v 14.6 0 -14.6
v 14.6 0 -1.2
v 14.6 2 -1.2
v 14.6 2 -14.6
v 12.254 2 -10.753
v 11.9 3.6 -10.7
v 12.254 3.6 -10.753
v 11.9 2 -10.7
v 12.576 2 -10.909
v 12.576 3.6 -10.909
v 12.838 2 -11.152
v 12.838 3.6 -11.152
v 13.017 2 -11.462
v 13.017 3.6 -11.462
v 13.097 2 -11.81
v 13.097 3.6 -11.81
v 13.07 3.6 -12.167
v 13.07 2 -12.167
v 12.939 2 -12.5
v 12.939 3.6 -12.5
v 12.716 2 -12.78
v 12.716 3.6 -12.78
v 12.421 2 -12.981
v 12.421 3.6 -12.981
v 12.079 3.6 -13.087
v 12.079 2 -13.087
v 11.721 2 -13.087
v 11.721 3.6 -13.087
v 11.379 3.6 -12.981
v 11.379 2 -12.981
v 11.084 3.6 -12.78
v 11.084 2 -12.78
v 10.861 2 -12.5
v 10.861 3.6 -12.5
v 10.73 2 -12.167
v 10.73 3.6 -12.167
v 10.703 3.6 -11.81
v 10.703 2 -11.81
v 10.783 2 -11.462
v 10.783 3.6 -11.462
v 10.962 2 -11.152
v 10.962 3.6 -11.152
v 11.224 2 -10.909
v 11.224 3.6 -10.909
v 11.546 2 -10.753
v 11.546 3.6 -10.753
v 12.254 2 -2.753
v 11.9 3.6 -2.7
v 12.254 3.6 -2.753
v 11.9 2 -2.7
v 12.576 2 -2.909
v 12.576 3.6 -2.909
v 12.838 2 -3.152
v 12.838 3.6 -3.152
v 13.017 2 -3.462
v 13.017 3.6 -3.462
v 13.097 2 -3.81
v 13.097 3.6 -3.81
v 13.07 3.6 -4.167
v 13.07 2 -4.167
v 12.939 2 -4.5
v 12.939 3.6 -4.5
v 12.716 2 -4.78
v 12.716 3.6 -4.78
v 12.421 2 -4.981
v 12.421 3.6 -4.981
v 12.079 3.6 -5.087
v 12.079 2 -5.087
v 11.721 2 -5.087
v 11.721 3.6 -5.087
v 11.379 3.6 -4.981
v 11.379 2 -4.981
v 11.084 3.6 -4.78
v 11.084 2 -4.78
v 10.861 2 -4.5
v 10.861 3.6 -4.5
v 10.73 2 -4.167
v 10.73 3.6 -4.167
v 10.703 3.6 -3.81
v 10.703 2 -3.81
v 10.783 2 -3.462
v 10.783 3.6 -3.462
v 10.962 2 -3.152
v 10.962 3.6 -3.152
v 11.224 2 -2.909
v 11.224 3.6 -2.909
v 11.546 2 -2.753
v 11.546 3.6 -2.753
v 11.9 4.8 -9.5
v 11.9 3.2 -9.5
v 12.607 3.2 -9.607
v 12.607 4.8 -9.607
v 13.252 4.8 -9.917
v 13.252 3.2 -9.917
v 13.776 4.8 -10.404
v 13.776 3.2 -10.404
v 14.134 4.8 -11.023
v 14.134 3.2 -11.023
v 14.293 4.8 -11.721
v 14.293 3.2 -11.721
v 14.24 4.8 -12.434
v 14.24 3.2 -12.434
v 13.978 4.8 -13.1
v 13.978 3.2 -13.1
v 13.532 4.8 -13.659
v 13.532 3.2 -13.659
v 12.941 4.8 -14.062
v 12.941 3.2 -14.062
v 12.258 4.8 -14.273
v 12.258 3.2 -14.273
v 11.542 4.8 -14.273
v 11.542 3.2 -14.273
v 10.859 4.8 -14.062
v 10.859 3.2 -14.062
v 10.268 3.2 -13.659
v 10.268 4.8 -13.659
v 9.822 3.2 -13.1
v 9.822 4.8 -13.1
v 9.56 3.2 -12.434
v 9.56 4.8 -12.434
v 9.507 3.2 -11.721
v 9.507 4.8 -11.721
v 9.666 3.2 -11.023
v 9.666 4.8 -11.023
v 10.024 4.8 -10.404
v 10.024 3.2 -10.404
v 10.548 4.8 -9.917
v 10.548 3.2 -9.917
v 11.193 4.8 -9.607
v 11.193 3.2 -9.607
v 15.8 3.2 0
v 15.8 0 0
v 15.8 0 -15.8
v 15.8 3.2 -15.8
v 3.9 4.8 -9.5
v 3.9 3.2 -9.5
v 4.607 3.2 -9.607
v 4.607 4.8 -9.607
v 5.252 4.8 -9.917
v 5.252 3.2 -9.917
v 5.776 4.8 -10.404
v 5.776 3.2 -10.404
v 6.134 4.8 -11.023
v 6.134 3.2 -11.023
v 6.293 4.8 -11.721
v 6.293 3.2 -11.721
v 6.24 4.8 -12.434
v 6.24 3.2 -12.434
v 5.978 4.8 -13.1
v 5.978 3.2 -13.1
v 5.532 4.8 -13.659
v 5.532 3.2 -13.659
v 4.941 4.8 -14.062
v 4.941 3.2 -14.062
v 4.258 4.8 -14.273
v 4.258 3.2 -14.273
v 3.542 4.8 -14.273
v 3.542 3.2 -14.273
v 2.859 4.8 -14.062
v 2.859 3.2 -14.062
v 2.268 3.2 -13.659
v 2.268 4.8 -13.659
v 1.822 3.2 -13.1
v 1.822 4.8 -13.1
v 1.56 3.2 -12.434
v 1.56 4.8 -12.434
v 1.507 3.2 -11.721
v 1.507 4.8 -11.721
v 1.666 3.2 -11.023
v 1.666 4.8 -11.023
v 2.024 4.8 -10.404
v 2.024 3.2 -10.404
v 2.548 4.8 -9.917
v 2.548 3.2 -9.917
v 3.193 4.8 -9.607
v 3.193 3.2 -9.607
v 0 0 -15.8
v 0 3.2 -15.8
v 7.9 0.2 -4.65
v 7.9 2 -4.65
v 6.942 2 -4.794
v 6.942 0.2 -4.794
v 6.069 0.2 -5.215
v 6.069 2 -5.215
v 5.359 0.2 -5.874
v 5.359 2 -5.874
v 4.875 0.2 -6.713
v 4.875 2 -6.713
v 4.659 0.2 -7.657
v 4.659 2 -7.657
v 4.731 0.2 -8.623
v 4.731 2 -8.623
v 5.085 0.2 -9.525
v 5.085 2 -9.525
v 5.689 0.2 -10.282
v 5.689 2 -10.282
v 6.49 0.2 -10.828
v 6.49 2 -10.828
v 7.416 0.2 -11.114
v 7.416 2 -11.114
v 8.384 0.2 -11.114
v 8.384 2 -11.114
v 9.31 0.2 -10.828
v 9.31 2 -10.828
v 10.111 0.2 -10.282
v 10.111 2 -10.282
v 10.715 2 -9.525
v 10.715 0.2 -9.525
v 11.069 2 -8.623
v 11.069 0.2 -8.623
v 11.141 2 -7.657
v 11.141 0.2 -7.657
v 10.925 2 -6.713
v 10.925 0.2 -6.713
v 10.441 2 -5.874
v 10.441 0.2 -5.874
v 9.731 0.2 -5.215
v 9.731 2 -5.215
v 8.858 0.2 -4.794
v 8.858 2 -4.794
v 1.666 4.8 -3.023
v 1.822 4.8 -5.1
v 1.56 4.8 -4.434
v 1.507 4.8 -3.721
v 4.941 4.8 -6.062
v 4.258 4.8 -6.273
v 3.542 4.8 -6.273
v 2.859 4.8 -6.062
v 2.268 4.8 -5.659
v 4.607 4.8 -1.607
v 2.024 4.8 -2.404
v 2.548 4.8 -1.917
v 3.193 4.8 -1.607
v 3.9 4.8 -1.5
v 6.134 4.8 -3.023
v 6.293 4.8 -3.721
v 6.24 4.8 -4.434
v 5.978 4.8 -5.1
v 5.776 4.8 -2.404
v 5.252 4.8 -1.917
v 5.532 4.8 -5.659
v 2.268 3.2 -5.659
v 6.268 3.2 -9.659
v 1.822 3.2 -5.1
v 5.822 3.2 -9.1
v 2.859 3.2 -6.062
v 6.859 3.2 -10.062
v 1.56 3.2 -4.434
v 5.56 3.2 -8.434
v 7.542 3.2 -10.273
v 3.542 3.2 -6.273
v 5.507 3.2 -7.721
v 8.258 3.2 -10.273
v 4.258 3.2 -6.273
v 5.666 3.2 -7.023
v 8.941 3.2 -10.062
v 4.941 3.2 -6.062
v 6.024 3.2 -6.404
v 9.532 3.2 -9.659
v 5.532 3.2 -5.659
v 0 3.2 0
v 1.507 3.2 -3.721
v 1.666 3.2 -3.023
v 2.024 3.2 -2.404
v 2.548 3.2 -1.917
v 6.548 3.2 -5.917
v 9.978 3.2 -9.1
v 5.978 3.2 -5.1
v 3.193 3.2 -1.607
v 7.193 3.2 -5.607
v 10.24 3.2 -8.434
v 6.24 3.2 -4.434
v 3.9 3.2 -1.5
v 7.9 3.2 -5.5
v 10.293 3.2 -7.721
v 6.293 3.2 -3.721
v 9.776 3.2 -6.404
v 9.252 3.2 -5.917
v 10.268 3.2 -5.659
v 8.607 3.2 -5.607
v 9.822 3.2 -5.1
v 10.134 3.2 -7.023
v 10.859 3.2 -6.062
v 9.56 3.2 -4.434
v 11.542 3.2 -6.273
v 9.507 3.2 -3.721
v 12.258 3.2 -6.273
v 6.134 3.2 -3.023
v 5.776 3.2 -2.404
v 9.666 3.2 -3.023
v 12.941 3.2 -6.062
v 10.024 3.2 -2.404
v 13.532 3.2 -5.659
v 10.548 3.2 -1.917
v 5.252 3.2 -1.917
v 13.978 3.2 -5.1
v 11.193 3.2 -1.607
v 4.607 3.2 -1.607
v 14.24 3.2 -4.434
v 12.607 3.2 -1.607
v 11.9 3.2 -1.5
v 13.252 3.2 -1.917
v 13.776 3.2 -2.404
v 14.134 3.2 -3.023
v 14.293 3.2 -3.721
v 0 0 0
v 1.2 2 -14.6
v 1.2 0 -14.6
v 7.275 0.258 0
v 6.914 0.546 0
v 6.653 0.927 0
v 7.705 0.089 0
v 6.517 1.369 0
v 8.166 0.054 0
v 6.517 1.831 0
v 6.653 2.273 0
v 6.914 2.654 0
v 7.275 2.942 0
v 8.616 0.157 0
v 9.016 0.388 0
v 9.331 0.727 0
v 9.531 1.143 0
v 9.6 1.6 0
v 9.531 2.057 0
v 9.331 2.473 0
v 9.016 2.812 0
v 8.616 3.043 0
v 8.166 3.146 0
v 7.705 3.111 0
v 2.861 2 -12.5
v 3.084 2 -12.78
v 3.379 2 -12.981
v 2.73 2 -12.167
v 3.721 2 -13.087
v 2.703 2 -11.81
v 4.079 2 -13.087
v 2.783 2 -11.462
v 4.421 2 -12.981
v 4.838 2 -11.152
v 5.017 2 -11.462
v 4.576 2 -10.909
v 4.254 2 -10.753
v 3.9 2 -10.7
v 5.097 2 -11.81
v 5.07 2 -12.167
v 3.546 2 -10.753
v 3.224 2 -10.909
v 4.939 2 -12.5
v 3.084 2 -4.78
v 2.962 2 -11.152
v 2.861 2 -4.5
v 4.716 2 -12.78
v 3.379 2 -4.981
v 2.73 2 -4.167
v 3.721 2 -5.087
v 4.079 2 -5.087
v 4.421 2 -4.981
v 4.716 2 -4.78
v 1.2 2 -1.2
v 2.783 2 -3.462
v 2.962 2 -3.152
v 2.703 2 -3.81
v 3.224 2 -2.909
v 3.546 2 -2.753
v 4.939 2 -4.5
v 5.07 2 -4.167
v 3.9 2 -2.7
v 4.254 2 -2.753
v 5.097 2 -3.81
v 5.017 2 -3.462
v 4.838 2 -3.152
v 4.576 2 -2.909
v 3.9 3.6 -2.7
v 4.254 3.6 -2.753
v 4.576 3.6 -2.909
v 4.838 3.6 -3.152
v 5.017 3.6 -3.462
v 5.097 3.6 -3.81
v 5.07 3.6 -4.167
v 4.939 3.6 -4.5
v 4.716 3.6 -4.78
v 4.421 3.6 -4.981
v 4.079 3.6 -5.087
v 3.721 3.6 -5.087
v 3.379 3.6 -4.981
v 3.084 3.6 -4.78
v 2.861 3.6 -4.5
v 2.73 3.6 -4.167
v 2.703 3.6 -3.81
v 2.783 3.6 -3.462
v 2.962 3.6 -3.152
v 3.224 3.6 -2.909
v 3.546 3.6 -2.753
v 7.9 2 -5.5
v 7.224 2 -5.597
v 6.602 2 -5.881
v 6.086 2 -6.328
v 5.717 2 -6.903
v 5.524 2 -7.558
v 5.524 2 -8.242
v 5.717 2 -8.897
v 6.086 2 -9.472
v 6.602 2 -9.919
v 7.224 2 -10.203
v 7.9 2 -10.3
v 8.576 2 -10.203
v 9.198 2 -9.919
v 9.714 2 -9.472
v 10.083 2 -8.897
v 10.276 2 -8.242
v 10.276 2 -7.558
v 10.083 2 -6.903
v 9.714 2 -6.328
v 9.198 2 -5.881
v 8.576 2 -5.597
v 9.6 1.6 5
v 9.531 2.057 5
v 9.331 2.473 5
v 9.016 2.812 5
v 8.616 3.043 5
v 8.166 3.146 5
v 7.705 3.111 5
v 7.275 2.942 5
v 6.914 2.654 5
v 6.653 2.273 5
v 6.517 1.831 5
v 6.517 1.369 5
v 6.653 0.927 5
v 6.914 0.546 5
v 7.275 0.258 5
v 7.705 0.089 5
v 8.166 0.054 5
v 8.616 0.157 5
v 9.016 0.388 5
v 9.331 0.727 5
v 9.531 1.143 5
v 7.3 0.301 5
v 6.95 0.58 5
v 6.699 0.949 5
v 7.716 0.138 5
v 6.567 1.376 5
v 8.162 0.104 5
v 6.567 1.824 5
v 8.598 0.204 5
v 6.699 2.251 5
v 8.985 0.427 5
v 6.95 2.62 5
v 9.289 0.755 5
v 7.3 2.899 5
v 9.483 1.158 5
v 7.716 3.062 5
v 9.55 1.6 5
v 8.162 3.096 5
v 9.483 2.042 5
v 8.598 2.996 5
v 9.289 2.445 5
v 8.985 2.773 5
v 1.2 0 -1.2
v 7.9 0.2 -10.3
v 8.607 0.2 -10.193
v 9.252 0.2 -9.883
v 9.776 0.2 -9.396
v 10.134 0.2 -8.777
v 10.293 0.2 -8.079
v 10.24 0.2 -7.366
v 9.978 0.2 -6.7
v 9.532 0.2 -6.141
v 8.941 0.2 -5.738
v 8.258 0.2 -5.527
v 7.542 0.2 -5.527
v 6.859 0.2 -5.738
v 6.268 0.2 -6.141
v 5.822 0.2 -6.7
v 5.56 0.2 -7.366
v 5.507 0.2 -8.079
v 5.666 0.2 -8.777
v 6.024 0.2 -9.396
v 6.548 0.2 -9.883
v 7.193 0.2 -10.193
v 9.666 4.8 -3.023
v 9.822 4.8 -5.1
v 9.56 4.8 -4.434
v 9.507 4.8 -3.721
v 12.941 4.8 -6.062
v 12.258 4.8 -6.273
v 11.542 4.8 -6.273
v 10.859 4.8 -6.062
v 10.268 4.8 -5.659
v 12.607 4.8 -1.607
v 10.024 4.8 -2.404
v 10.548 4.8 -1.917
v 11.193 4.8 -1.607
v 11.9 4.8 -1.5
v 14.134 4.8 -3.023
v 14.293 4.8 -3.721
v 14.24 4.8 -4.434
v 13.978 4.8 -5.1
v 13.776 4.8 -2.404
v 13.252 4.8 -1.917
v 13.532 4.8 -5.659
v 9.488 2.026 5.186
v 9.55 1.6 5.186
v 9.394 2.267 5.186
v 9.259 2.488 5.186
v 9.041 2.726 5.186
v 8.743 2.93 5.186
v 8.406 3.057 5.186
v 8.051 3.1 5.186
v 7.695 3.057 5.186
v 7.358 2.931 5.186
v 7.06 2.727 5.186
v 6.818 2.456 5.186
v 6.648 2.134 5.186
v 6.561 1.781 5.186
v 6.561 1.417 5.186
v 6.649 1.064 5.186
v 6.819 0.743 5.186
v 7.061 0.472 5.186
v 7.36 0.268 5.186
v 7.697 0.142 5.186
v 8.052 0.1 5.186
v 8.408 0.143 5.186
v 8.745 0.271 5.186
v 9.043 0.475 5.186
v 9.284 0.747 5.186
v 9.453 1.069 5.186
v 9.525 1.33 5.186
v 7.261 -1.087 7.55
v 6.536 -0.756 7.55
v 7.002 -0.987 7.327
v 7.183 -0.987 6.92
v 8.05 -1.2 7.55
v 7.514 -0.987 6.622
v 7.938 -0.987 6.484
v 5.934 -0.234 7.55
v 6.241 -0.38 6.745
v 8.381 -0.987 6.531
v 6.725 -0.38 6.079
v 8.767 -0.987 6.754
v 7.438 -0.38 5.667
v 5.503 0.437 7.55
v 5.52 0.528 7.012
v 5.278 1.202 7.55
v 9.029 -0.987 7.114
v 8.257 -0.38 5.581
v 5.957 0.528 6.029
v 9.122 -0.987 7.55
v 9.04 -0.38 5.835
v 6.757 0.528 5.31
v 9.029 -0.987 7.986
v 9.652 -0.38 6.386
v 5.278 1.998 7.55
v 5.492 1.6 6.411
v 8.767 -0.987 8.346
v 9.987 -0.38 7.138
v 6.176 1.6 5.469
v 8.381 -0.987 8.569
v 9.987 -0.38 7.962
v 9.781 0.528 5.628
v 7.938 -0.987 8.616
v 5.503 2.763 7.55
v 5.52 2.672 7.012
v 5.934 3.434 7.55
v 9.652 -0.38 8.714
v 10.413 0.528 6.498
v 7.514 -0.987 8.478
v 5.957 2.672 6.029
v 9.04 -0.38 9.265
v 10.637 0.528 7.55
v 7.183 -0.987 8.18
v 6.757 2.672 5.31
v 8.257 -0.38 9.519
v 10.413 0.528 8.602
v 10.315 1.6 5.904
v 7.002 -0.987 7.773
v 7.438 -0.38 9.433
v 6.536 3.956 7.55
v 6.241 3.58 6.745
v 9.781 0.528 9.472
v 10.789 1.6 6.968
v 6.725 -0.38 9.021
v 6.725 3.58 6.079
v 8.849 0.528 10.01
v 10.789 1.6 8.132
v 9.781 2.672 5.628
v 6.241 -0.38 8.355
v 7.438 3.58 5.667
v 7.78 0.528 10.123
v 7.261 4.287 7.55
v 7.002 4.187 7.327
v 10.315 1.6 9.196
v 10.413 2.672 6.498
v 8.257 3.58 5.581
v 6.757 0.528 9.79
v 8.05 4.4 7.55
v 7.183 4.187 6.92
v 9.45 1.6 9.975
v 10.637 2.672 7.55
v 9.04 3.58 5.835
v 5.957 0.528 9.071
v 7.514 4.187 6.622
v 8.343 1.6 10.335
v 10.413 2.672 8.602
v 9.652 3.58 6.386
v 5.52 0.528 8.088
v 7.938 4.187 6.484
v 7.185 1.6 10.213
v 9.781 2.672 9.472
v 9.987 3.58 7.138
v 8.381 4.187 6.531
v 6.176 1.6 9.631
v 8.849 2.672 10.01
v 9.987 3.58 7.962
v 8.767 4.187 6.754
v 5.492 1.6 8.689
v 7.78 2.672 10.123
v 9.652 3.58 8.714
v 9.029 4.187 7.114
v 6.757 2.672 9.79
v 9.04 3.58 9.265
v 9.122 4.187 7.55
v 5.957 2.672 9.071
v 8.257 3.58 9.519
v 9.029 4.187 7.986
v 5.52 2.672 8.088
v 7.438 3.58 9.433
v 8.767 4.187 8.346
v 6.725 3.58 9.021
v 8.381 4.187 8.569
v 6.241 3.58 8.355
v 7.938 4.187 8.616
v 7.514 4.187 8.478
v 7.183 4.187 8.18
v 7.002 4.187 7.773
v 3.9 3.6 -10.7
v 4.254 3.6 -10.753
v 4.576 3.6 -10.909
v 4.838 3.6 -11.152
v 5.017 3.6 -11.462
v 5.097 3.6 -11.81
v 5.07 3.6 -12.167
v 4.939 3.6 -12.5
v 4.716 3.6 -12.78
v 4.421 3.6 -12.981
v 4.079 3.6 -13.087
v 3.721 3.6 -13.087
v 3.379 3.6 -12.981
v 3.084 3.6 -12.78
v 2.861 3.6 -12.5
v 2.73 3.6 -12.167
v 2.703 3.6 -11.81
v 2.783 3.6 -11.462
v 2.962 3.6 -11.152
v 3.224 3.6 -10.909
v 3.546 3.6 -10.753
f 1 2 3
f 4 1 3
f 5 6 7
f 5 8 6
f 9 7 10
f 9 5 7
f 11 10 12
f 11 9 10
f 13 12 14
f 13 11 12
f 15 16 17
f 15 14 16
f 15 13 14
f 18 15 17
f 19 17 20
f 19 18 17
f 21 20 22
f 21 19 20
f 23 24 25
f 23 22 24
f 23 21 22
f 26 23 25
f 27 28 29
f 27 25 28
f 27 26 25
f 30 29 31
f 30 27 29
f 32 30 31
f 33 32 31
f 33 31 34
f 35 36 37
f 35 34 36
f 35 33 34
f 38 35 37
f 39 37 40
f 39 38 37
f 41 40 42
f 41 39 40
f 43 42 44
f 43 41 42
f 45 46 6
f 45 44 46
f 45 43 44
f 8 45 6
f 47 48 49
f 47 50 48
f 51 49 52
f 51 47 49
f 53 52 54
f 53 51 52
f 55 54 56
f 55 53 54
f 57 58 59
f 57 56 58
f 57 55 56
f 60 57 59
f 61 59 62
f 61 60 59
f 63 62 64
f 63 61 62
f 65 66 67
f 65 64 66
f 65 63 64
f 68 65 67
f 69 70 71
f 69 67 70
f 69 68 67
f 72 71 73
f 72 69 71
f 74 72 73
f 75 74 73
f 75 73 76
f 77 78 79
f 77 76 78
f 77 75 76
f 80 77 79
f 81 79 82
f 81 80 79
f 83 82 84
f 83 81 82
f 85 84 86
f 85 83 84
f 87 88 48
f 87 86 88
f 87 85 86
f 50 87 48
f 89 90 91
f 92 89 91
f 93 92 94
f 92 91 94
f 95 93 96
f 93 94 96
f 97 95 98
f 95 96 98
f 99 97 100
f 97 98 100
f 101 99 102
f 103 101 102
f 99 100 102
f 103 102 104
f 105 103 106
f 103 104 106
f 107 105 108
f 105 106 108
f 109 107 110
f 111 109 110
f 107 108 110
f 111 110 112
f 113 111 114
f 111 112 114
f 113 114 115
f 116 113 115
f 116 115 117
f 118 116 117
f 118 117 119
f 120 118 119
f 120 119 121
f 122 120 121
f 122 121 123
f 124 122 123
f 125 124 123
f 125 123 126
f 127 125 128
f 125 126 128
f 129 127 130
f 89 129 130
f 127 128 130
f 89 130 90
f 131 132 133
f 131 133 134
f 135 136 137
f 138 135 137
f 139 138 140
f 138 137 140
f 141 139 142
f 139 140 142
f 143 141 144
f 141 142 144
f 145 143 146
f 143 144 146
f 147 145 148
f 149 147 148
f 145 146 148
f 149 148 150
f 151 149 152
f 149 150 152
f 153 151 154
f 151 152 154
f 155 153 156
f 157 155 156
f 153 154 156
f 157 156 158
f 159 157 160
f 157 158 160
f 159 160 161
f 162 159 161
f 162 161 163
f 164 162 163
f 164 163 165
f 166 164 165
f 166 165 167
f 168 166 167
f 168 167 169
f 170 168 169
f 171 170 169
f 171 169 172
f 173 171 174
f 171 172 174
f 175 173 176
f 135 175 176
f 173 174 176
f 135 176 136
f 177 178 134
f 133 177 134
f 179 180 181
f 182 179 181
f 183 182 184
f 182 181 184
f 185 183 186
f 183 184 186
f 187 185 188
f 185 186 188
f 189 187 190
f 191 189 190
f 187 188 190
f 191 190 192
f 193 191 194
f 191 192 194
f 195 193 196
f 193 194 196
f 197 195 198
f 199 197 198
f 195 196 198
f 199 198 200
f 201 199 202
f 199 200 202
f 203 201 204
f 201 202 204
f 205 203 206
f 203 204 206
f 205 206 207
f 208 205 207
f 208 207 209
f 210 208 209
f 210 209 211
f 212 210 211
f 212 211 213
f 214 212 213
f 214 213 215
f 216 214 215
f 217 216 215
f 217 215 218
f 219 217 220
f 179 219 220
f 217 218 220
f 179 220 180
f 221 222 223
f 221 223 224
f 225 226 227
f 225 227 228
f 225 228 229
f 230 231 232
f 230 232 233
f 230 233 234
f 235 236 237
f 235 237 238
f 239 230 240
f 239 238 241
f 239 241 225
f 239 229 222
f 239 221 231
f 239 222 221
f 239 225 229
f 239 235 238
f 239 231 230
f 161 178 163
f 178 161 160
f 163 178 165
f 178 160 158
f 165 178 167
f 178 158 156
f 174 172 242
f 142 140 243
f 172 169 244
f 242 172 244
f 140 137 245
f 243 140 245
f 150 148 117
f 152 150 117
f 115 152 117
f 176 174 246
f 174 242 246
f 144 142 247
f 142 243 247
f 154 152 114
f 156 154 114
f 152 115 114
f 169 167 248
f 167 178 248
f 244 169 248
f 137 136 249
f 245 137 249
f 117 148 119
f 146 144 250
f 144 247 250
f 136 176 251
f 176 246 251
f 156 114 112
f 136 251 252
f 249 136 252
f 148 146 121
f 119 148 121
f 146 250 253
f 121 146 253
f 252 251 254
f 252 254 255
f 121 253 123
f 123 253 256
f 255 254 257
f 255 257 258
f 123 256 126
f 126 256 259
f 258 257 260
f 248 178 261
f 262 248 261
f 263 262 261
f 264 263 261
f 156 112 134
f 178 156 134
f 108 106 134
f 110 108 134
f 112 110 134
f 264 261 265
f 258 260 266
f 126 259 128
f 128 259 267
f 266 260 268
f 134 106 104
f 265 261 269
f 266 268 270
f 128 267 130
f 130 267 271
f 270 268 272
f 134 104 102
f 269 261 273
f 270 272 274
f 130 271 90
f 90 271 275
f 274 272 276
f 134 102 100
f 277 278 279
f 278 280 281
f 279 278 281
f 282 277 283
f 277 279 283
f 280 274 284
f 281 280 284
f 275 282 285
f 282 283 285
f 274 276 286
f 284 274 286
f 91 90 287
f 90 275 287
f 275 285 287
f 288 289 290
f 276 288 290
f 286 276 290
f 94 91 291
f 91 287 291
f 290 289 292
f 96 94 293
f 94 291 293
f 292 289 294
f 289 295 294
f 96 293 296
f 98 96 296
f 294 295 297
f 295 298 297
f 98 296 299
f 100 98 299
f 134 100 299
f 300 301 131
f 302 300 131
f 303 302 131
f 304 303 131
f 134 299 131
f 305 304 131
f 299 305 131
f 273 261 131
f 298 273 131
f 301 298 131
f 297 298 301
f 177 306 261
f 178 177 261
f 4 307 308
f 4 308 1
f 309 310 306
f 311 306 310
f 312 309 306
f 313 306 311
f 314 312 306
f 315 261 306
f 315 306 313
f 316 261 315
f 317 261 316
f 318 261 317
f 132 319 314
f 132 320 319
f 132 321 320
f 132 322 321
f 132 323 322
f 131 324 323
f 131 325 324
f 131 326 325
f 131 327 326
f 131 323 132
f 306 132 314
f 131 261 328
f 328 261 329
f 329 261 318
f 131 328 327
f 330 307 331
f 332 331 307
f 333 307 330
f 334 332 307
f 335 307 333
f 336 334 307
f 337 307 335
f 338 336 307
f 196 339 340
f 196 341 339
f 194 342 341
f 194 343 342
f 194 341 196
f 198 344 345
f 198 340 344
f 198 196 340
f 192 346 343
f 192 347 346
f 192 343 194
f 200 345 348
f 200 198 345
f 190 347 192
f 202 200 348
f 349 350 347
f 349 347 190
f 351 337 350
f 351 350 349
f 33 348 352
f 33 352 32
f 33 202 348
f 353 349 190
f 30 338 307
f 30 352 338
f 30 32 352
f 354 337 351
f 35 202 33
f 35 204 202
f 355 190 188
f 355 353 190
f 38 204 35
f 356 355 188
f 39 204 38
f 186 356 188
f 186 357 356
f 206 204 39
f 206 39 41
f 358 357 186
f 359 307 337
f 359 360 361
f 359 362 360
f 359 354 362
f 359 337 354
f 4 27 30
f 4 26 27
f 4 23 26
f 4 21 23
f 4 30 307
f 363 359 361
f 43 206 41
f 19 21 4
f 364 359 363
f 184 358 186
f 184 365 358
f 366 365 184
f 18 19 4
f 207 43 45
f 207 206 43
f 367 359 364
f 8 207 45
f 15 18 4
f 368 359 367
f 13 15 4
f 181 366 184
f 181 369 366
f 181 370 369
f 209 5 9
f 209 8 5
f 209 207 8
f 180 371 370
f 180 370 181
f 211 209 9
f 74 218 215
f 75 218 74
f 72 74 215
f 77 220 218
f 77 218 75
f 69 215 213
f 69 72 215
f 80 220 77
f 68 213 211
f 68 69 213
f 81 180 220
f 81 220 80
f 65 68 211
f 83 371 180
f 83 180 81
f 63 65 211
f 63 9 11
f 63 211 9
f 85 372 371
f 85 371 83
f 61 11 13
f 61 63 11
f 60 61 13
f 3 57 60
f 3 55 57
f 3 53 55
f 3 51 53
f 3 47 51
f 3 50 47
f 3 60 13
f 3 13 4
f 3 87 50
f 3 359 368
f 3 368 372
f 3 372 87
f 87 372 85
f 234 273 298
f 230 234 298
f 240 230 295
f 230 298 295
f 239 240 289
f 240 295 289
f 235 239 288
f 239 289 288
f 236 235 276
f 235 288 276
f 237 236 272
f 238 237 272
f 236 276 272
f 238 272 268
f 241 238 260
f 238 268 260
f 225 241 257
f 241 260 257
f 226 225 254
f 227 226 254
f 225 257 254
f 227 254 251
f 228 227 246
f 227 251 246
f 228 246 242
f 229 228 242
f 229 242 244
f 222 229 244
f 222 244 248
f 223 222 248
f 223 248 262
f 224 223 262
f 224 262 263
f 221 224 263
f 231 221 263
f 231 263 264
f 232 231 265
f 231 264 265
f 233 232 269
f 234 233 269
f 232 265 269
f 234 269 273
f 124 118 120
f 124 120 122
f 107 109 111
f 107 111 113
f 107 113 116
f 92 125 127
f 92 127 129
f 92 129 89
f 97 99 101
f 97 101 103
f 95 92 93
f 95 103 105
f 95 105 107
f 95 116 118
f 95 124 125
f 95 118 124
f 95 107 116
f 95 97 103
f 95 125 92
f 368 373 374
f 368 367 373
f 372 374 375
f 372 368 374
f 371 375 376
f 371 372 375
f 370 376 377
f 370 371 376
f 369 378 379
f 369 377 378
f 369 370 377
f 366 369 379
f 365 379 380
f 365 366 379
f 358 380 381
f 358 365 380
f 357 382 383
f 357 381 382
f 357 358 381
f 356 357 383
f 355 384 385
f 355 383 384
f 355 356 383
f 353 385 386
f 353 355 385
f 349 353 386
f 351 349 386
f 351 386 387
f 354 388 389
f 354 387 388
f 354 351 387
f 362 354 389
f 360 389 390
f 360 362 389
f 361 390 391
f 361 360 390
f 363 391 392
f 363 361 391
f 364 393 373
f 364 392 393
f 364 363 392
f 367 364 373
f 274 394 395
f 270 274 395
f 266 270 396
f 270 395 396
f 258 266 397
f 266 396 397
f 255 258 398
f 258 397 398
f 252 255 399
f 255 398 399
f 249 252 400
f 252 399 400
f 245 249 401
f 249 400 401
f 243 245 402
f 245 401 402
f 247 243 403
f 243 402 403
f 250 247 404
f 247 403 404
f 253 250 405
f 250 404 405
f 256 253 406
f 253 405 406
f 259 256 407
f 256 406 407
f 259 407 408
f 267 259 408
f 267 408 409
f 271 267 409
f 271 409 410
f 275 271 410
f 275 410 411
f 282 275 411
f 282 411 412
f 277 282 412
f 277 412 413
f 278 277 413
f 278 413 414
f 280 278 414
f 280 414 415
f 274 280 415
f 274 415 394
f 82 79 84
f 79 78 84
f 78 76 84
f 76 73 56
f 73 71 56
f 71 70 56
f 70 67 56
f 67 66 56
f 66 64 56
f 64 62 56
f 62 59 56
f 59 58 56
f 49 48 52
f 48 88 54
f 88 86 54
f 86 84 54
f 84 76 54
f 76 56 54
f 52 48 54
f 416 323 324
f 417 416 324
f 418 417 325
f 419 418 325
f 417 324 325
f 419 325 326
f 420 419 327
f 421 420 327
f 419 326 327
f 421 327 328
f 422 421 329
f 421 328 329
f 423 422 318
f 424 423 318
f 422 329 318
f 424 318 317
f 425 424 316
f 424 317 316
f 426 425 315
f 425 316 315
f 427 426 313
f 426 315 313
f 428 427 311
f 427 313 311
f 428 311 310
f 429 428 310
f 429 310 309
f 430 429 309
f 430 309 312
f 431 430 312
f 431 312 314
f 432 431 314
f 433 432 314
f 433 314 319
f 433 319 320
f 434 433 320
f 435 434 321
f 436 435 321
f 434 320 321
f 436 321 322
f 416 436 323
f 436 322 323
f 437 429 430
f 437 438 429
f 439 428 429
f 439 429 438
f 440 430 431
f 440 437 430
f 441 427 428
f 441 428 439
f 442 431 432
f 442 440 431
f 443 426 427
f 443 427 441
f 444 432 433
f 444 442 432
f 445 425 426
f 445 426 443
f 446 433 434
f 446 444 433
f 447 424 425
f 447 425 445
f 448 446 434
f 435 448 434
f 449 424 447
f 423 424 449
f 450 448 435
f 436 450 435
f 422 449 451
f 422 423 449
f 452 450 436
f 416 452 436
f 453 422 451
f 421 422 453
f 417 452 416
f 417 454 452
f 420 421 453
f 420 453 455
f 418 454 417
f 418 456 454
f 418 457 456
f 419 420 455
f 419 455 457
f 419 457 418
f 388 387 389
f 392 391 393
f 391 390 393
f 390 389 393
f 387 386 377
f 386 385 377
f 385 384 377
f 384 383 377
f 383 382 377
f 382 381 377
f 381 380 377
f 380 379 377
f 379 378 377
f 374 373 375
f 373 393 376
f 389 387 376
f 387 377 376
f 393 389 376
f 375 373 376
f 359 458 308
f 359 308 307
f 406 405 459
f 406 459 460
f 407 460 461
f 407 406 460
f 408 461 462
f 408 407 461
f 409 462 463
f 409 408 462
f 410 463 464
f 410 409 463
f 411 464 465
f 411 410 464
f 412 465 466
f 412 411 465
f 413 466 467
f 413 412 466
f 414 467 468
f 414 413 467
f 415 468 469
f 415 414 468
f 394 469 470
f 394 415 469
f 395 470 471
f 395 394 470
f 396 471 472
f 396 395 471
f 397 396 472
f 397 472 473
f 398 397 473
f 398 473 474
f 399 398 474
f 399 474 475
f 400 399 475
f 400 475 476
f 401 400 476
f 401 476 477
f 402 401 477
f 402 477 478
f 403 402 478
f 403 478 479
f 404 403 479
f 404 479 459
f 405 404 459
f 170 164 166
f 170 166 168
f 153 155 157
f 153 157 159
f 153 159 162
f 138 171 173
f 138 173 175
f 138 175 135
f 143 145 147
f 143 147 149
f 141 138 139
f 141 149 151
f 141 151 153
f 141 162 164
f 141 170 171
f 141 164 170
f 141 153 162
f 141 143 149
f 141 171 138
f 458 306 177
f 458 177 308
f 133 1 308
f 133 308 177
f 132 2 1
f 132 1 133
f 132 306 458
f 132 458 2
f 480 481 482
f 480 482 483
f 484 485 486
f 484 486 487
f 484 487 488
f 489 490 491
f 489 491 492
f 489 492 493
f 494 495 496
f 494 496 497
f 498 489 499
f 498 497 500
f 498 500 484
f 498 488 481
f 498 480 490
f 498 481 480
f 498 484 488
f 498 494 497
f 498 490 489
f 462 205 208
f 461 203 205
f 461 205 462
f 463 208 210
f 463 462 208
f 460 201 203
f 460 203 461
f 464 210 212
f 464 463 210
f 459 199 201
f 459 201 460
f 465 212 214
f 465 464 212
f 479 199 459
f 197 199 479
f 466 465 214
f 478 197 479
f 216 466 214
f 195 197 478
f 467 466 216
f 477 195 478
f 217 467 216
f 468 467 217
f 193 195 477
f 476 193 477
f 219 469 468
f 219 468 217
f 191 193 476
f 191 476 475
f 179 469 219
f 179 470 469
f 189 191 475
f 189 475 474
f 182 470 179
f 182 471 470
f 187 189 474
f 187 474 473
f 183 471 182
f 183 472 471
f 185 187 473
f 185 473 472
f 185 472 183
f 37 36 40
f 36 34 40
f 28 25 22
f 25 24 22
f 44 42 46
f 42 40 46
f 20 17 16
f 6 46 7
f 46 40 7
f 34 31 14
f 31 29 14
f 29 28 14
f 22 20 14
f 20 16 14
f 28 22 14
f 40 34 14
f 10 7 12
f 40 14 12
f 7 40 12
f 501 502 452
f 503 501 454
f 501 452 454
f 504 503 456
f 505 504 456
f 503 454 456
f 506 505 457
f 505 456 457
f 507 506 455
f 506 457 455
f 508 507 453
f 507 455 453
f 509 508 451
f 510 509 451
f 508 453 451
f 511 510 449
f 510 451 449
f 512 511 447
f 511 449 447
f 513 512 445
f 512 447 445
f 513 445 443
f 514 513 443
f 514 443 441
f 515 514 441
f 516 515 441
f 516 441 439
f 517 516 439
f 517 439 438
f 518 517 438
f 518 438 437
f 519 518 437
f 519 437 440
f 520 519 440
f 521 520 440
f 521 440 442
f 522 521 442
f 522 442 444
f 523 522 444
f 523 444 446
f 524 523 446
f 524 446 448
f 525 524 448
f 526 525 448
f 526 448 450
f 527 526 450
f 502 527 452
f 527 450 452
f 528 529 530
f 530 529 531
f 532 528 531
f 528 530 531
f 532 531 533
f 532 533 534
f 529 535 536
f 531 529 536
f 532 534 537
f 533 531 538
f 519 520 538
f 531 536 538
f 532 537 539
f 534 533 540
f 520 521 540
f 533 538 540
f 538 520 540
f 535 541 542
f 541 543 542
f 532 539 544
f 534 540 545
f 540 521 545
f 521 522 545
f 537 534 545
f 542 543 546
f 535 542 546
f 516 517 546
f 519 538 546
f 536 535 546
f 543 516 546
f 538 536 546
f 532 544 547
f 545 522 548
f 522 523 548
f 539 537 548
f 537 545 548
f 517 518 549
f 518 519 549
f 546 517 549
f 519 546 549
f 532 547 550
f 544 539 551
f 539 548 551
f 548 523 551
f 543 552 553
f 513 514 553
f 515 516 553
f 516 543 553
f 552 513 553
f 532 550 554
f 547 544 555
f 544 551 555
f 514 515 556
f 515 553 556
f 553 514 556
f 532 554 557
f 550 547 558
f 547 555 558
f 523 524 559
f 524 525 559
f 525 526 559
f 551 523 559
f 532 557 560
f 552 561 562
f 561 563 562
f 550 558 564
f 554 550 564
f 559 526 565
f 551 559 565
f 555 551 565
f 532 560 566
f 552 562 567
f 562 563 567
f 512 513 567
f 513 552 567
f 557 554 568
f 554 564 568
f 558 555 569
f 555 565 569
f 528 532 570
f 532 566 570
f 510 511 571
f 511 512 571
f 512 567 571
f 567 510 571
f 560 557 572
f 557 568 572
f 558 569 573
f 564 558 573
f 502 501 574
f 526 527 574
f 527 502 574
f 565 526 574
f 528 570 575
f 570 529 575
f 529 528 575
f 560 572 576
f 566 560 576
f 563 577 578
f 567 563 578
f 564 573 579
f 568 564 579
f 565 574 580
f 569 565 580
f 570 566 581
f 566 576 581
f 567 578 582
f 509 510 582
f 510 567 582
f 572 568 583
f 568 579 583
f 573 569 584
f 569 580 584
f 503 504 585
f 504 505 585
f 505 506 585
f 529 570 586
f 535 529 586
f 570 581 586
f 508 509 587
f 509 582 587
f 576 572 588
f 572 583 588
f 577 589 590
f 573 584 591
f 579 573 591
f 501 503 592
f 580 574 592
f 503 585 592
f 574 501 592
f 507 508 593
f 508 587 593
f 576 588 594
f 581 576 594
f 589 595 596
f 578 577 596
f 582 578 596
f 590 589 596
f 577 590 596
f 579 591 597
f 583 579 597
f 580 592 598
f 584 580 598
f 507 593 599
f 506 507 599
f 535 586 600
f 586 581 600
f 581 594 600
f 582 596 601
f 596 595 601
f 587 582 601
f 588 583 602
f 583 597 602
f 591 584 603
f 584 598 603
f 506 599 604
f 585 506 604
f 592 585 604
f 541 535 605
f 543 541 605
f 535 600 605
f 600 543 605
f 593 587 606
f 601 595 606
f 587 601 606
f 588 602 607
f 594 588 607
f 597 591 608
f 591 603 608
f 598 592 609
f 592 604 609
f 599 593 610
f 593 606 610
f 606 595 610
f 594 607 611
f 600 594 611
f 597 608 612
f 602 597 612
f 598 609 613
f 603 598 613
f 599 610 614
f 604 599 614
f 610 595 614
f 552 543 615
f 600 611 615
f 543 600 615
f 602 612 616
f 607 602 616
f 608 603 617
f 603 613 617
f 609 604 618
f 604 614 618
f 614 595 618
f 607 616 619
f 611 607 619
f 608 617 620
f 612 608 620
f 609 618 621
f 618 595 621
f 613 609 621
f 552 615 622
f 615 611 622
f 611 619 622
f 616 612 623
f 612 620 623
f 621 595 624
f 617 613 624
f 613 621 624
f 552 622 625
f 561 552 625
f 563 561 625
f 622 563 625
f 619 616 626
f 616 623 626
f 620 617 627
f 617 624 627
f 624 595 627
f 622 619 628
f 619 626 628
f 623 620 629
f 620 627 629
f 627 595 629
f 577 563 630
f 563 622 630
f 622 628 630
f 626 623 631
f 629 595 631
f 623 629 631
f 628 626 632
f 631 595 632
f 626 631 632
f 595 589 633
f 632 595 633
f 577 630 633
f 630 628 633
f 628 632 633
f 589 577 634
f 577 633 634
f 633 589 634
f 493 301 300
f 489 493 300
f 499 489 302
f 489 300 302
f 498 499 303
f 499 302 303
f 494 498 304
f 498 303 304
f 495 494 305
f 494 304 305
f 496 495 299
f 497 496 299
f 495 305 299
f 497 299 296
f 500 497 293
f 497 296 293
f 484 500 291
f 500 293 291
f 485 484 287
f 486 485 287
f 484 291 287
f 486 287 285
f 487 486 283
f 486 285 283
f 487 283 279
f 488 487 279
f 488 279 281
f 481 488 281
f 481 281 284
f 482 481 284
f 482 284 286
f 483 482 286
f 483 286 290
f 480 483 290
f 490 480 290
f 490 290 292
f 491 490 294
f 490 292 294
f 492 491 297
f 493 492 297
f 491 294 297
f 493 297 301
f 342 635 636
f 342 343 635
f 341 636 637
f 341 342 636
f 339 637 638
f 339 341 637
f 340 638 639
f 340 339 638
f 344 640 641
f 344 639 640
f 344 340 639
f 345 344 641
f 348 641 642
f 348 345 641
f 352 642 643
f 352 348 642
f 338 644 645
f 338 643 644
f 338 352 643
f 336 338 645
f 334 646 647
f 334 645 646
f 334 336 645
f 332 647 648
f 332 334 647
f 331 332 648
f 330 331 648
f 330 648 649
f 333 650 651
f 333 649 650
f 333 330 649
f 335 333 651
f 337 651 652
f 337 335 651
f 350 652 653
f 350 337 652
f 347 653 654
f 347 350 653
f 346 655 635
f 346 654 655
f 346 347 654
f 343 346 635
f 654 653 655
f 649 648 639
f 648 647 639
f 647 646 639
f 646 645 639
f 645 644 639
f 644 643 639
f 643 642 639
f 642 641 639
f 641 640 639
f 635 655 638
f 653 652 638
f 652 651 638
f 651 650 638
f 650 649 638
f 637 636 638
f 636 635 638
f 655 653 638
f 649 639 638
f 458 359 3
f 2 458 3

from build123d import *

# Parameters (mm, degrees)
SKETCH1_W            = 15.8
SKETCH1_H            = 3.2
BOSS_EXTRUDE1_DEPTH  = 15.8
SKETCH2_R            = 2.4
BOSS_EXTRUDE2_DEPTH  = 1.6
LPATTERN1_COUNT      = 2
LPATTERN1_PITCH      = 8
LPATTERN1_COUNT_DIR2 = 4
LPATTERN1_PITCH_DIR2 = 8
SHELL1_T             = -1.2
SKETCH4_R            = 3.25
SKETCH4_R_2          = 2.4
BOSS_EXTRUDE3_DEPTH  = 1.8
SKETCH6_R            = 2.4
CUT_EXTRUDE1_DEPTH   = 23.519325034
SKETCH11_R           = 1.55
BOSS_EXTRUDE5_DEPTH  = 5
BOSS_EXTRUDE7_REACH  = 28.558
SKETCH14_R           = 1.5


with BuildPart() as part:
    # Sketch1 → Boss-Extrude1 (new body)
    with BuildSketch(Plane.XY):
        with Locations((7.9, 1.6)):
            Rectangle(SKETCH1_W, SKETCH1_H)
    extrude(amount=-BOSS_EXTRUDE1_DEPTH)

    # Sketch2 → Boss-Extrude2 (add)
    with BuildSketch(Plane(origin=(0, 3.2, 0), x_dir=(1, 0, 0), z_dir=(0, 1, 0))):
        with Locations(Location((3.9, 3.9, 0), (0, 0, 270))):
            Circle(SKETCH2_R)
    boss_extrude2 = extrude(amount=BOSS_EXTRUDE2_DEPTH)

    # LPattern1: Boss-Extrude2 2 × 4, 4 skipped
    with Locations(*[(j * LPATTERN1_PITCH_DIR2, 0, -i * LPATTERN1_PITCH) for i in range(LPATTERN1_COUNT) for j in range(LPATTERN1_COUNT_DIR2) if (i, j) not in ((0, 0), (0, 2), (0, 3), (1, 2), (1, 3))]):
        add(boss_extrude2)

    # Shell1
    shell1_openings = [part.faces().sort_by_distance(p)[0] for p in [
        (7.9, 0, -7.9),
    ]]
    offset(amount=SHELL1_T, openings=shell1_openings, kind=Kind.INTERSECTION)

    # Sketch4 → Boss-Extrude3 (add)
    with BuildSketch(Plane.XZ.offset(-2)):
        with Locations(Location((7.9, -7.9, 0), (0, 0, 90))):
            Circle(SKETCH4_R)
        with Locations(Location((7.9, -7.9, 0), (0, 0, 270))):
            Circle(SKETCH4_R_2, mode=Mode.SUBTRACT)
    extrude(amount=BOSS_EXTRUDE3_DEPTH)

    # Sketch6 → Cut-Extrude1 (cut, through all)
    with BuildSketch(Plane.XZ.offset(-2)):
        with Locations(Location((7.9, -7.9, 0), (0, 0, 90))):
            Circle(SKETCH6_R)
    extrude(amount=-CUT_EXTRUDE1_DEPTH, mode=Mode.SUBTRACT)

    # Sketch11 → Boss-Extrude5 (add)
    with BuildSketch(Plane.XY):
        with Locations((8.05, 1.6)):
            Circle(SKETCH11_R)
    extrude(amount=BOSS_EXTRUDE5_DEPTH)


with BuildPart() as body_2:
    # Sketch12 → Revolve1 (revolve)
    with BuildSketch(Plane.XY.offset(7.55)):
        with BuildLine():
            Line((8.05, 4.4), (8.05, -1.2))
            ThreePointArc((8.05, -1.2), (5.25, 1.6), (8.05, 4.4))
        make_face()
    revolve(axis=Axis((8.05, 3.15, 7.55), (0, -1, 0)))

    # Sketch14 → Boss-Extrude7 (add, up to next)
    with BuildSketch(Plane.XY.offset(5), mode=Mode.PRIVATE) as boss_extrude7_sk1:
        with Locations((8.05, 1.6)):
            Circle(SKETCH14_R)
    boss_extrude7_tool1 = extrude(boss_extrude7_sk1.sketch, amount=BOSS_EXTRUDE7_REACH, mode=Mode.PRIVATE) - body_2.part

    add(part.part)  # Boss-Extrude7 merges part
    add(boss_extrude7_tool1.solids().sort_by_distance((8.05, 1.6, 5))[0])


solid = body_2.part
